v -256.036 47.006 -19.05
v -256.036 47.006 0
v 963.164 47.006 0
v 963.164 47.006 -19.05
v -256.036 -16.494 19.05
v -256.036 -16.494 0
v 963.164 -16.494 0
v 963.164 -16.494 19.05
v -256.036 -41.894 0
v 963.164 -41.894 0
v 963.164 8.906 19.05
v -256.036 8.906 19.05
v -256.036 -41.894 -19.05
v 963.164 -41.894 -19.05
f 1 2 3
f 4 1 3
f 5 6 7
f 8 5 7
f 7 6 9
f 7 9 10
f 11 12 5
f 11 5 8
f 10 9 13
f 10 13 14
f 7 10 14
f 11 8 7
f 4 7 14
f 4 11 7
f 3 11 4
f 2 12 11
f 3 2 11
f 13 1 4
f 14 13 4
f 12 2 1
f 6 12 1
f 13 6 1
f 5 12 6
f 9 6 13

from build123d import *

# Parameters (mm, degrees)
F0_W     = 1219.2
F0_H     = 63.5
F1_DEPTH = 19.05
F0_H_2   = 25.4
F2_DEPTH = 19.05
F3_SIZE2 = 38.1
F3_SIZE  = 19.05


with BuildPart() as f1:
    # F0 (on Top) → F1 (new body)
    with BuildSketch(Plane.XY):
        with Locations((353.564252, 15.255763)):
            Rectangle(F0_W, F0_H)
    extrude(amount=F1_DEPTH)

    # F0 (on Top) → F2 (join)
    with BuildSketch(Plane.XY):
        with Locations((353.564252, 15.255763)):
            Rectangle(F0_W, F0_H)
        with Locations((353.564252, -29.194237)):
            Rectangle(F0_W, F0_H_2)
    extrude(amount=-F2_DEPTH)

    # F3
    f3_edges = [f1.edges().sort_by_distance(p)[0] for p in [
        (353.564252, 47.005763, 19.05),
    ]]
    chamfer(f3_edges, length=F3_SIZE, length2=F3_SIZE2)


solid = f1.part
